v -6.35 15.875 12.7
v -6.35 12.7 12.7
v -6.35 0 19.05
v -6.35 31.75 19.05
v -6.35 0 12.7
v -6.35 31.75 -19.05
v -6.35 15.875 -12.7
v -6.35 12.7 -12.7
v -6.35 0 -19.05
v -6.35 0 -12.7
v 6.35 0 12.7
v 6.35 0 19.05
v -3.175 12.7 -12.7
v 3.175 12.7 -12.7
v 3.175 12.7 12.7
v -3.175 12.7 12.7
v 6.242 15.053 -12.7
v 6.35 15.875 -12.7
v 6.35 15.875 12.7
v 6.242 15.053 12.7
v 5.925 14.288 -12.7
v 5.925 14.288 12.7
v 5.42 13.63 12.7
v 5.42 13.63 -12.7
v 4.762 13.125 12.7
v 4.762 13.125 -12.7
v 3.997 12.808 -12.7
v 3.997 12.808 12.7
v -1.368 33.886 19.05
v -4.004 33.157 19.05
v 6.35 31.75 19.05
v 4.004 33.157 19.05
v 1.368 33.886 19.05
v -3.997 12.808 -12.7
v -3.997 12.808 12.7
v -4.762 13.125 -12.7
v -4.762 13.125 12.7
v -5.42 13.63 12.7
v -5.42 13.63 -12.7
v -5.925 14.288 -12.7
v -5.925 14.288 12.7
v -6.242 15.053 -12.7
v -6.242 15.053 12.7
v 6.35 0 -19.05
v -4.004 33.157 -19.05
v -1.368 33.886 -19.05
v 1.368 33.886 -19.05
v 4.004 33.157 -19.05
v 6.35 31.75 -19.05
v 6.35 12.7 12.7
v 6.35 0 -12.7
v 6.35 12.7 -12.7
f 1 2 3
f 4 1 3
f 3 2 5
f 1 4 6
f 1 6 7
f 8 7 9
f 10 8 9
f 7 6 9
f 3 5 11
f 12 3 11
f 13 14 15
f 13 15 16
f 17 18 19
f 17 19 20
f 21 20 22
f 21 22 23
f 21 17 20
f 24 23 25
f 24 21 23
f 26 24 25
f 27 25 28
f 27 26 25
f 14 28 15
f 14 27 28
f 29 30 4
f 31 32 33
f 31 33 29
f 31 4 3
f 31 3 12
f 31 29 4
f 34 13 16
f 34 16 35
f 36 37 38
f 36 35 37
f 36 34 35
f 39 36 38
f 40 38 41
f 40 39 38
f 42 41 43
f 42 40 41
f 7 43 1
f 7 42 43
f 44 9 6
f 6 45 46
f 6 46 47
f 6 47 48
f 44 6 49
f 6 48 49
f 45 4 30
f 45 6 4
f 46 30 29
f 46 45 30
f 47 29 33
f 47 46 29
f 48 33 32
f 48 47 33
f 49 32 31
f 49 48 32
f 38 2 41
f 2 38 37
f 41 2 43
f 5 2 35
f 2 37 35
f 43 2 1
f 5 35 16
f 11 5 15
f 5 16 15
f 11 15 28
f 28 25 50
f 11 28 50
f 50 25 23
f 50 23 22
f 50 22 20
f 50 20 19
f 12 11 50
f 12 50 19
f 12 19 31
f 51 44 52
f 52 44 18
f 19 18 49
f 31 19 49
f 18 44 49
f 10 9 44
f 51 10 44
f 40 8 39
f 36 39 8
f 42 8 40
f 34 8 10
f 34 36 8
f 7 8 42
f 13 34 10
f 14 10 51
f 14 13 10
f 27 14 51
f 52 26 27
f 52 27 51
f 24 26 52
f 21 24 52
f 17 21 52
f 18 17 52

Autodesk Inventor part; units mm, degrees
ref_plane "YZ Plane" through (0, 0, 0) normal (1, 0, 0) x (0, 1, 0)
ref_plane "XZ Plane" through (0, 0, 0) normal (0, 1, 0) x (-1, 0, 0)
ref_plane "XY Plane" through (0, 0, 0) normal (0, 0, 1) x (1, 0, 0)
sketch "Sketch1" plane through (0, 0, 0) normal (0, 0, 1) x (1, 0, 0)
  line L0 (-6.35, 31.75) -> (-6.35, 0)
  line L1 (-6.35, 0) -> (6.35, 0)
  line L2 (6.35, 0) -> (6.35, 31.75)
  arc A0 (6.35, 31.75) -> (-6.35, 31.75) centre (0, 23.8189) ccw
  point P0 (0, 0)
  dimension "d1" = 31.75
  dimension "d2" = 12.7
  dimension "d3" = 10.16
extrude "Extrusion1" add sketch "Sketch1" along normal mid plane 38.1
sketch "Sketch2" plane through (0, 0, 0) normal (0, 0, 1) x (1, 0, 0)
  line L0 (-6.35, 0) -> (6.35, 0)
  line L1 (6.35, 0) -> (6.35, 12.7)
  line L2 (6.35, 12.7) -> (-6.35, 12.7)
  line L3 (-6.35, 12.7) -> (-6.35, 0)
  line L4 (0, -2.54) -> (0, 15.24) projected
  point P0 (0, 0)
  dimension "d6" = 12.7
  dimension "d7" = 6.35
  dimension "d10" = 12.7
extrude "Extrusion2" cut sketch "Sketch2" along normal mid plane 25.4
fillet "Fillet1" radius 3.175 2 edges at (-6.35, 12.7, 0) (6.35, 12.7, 0)
equation "\"d7\" = 0.5 * d6"
properties part number "Odyssey Bushing"
